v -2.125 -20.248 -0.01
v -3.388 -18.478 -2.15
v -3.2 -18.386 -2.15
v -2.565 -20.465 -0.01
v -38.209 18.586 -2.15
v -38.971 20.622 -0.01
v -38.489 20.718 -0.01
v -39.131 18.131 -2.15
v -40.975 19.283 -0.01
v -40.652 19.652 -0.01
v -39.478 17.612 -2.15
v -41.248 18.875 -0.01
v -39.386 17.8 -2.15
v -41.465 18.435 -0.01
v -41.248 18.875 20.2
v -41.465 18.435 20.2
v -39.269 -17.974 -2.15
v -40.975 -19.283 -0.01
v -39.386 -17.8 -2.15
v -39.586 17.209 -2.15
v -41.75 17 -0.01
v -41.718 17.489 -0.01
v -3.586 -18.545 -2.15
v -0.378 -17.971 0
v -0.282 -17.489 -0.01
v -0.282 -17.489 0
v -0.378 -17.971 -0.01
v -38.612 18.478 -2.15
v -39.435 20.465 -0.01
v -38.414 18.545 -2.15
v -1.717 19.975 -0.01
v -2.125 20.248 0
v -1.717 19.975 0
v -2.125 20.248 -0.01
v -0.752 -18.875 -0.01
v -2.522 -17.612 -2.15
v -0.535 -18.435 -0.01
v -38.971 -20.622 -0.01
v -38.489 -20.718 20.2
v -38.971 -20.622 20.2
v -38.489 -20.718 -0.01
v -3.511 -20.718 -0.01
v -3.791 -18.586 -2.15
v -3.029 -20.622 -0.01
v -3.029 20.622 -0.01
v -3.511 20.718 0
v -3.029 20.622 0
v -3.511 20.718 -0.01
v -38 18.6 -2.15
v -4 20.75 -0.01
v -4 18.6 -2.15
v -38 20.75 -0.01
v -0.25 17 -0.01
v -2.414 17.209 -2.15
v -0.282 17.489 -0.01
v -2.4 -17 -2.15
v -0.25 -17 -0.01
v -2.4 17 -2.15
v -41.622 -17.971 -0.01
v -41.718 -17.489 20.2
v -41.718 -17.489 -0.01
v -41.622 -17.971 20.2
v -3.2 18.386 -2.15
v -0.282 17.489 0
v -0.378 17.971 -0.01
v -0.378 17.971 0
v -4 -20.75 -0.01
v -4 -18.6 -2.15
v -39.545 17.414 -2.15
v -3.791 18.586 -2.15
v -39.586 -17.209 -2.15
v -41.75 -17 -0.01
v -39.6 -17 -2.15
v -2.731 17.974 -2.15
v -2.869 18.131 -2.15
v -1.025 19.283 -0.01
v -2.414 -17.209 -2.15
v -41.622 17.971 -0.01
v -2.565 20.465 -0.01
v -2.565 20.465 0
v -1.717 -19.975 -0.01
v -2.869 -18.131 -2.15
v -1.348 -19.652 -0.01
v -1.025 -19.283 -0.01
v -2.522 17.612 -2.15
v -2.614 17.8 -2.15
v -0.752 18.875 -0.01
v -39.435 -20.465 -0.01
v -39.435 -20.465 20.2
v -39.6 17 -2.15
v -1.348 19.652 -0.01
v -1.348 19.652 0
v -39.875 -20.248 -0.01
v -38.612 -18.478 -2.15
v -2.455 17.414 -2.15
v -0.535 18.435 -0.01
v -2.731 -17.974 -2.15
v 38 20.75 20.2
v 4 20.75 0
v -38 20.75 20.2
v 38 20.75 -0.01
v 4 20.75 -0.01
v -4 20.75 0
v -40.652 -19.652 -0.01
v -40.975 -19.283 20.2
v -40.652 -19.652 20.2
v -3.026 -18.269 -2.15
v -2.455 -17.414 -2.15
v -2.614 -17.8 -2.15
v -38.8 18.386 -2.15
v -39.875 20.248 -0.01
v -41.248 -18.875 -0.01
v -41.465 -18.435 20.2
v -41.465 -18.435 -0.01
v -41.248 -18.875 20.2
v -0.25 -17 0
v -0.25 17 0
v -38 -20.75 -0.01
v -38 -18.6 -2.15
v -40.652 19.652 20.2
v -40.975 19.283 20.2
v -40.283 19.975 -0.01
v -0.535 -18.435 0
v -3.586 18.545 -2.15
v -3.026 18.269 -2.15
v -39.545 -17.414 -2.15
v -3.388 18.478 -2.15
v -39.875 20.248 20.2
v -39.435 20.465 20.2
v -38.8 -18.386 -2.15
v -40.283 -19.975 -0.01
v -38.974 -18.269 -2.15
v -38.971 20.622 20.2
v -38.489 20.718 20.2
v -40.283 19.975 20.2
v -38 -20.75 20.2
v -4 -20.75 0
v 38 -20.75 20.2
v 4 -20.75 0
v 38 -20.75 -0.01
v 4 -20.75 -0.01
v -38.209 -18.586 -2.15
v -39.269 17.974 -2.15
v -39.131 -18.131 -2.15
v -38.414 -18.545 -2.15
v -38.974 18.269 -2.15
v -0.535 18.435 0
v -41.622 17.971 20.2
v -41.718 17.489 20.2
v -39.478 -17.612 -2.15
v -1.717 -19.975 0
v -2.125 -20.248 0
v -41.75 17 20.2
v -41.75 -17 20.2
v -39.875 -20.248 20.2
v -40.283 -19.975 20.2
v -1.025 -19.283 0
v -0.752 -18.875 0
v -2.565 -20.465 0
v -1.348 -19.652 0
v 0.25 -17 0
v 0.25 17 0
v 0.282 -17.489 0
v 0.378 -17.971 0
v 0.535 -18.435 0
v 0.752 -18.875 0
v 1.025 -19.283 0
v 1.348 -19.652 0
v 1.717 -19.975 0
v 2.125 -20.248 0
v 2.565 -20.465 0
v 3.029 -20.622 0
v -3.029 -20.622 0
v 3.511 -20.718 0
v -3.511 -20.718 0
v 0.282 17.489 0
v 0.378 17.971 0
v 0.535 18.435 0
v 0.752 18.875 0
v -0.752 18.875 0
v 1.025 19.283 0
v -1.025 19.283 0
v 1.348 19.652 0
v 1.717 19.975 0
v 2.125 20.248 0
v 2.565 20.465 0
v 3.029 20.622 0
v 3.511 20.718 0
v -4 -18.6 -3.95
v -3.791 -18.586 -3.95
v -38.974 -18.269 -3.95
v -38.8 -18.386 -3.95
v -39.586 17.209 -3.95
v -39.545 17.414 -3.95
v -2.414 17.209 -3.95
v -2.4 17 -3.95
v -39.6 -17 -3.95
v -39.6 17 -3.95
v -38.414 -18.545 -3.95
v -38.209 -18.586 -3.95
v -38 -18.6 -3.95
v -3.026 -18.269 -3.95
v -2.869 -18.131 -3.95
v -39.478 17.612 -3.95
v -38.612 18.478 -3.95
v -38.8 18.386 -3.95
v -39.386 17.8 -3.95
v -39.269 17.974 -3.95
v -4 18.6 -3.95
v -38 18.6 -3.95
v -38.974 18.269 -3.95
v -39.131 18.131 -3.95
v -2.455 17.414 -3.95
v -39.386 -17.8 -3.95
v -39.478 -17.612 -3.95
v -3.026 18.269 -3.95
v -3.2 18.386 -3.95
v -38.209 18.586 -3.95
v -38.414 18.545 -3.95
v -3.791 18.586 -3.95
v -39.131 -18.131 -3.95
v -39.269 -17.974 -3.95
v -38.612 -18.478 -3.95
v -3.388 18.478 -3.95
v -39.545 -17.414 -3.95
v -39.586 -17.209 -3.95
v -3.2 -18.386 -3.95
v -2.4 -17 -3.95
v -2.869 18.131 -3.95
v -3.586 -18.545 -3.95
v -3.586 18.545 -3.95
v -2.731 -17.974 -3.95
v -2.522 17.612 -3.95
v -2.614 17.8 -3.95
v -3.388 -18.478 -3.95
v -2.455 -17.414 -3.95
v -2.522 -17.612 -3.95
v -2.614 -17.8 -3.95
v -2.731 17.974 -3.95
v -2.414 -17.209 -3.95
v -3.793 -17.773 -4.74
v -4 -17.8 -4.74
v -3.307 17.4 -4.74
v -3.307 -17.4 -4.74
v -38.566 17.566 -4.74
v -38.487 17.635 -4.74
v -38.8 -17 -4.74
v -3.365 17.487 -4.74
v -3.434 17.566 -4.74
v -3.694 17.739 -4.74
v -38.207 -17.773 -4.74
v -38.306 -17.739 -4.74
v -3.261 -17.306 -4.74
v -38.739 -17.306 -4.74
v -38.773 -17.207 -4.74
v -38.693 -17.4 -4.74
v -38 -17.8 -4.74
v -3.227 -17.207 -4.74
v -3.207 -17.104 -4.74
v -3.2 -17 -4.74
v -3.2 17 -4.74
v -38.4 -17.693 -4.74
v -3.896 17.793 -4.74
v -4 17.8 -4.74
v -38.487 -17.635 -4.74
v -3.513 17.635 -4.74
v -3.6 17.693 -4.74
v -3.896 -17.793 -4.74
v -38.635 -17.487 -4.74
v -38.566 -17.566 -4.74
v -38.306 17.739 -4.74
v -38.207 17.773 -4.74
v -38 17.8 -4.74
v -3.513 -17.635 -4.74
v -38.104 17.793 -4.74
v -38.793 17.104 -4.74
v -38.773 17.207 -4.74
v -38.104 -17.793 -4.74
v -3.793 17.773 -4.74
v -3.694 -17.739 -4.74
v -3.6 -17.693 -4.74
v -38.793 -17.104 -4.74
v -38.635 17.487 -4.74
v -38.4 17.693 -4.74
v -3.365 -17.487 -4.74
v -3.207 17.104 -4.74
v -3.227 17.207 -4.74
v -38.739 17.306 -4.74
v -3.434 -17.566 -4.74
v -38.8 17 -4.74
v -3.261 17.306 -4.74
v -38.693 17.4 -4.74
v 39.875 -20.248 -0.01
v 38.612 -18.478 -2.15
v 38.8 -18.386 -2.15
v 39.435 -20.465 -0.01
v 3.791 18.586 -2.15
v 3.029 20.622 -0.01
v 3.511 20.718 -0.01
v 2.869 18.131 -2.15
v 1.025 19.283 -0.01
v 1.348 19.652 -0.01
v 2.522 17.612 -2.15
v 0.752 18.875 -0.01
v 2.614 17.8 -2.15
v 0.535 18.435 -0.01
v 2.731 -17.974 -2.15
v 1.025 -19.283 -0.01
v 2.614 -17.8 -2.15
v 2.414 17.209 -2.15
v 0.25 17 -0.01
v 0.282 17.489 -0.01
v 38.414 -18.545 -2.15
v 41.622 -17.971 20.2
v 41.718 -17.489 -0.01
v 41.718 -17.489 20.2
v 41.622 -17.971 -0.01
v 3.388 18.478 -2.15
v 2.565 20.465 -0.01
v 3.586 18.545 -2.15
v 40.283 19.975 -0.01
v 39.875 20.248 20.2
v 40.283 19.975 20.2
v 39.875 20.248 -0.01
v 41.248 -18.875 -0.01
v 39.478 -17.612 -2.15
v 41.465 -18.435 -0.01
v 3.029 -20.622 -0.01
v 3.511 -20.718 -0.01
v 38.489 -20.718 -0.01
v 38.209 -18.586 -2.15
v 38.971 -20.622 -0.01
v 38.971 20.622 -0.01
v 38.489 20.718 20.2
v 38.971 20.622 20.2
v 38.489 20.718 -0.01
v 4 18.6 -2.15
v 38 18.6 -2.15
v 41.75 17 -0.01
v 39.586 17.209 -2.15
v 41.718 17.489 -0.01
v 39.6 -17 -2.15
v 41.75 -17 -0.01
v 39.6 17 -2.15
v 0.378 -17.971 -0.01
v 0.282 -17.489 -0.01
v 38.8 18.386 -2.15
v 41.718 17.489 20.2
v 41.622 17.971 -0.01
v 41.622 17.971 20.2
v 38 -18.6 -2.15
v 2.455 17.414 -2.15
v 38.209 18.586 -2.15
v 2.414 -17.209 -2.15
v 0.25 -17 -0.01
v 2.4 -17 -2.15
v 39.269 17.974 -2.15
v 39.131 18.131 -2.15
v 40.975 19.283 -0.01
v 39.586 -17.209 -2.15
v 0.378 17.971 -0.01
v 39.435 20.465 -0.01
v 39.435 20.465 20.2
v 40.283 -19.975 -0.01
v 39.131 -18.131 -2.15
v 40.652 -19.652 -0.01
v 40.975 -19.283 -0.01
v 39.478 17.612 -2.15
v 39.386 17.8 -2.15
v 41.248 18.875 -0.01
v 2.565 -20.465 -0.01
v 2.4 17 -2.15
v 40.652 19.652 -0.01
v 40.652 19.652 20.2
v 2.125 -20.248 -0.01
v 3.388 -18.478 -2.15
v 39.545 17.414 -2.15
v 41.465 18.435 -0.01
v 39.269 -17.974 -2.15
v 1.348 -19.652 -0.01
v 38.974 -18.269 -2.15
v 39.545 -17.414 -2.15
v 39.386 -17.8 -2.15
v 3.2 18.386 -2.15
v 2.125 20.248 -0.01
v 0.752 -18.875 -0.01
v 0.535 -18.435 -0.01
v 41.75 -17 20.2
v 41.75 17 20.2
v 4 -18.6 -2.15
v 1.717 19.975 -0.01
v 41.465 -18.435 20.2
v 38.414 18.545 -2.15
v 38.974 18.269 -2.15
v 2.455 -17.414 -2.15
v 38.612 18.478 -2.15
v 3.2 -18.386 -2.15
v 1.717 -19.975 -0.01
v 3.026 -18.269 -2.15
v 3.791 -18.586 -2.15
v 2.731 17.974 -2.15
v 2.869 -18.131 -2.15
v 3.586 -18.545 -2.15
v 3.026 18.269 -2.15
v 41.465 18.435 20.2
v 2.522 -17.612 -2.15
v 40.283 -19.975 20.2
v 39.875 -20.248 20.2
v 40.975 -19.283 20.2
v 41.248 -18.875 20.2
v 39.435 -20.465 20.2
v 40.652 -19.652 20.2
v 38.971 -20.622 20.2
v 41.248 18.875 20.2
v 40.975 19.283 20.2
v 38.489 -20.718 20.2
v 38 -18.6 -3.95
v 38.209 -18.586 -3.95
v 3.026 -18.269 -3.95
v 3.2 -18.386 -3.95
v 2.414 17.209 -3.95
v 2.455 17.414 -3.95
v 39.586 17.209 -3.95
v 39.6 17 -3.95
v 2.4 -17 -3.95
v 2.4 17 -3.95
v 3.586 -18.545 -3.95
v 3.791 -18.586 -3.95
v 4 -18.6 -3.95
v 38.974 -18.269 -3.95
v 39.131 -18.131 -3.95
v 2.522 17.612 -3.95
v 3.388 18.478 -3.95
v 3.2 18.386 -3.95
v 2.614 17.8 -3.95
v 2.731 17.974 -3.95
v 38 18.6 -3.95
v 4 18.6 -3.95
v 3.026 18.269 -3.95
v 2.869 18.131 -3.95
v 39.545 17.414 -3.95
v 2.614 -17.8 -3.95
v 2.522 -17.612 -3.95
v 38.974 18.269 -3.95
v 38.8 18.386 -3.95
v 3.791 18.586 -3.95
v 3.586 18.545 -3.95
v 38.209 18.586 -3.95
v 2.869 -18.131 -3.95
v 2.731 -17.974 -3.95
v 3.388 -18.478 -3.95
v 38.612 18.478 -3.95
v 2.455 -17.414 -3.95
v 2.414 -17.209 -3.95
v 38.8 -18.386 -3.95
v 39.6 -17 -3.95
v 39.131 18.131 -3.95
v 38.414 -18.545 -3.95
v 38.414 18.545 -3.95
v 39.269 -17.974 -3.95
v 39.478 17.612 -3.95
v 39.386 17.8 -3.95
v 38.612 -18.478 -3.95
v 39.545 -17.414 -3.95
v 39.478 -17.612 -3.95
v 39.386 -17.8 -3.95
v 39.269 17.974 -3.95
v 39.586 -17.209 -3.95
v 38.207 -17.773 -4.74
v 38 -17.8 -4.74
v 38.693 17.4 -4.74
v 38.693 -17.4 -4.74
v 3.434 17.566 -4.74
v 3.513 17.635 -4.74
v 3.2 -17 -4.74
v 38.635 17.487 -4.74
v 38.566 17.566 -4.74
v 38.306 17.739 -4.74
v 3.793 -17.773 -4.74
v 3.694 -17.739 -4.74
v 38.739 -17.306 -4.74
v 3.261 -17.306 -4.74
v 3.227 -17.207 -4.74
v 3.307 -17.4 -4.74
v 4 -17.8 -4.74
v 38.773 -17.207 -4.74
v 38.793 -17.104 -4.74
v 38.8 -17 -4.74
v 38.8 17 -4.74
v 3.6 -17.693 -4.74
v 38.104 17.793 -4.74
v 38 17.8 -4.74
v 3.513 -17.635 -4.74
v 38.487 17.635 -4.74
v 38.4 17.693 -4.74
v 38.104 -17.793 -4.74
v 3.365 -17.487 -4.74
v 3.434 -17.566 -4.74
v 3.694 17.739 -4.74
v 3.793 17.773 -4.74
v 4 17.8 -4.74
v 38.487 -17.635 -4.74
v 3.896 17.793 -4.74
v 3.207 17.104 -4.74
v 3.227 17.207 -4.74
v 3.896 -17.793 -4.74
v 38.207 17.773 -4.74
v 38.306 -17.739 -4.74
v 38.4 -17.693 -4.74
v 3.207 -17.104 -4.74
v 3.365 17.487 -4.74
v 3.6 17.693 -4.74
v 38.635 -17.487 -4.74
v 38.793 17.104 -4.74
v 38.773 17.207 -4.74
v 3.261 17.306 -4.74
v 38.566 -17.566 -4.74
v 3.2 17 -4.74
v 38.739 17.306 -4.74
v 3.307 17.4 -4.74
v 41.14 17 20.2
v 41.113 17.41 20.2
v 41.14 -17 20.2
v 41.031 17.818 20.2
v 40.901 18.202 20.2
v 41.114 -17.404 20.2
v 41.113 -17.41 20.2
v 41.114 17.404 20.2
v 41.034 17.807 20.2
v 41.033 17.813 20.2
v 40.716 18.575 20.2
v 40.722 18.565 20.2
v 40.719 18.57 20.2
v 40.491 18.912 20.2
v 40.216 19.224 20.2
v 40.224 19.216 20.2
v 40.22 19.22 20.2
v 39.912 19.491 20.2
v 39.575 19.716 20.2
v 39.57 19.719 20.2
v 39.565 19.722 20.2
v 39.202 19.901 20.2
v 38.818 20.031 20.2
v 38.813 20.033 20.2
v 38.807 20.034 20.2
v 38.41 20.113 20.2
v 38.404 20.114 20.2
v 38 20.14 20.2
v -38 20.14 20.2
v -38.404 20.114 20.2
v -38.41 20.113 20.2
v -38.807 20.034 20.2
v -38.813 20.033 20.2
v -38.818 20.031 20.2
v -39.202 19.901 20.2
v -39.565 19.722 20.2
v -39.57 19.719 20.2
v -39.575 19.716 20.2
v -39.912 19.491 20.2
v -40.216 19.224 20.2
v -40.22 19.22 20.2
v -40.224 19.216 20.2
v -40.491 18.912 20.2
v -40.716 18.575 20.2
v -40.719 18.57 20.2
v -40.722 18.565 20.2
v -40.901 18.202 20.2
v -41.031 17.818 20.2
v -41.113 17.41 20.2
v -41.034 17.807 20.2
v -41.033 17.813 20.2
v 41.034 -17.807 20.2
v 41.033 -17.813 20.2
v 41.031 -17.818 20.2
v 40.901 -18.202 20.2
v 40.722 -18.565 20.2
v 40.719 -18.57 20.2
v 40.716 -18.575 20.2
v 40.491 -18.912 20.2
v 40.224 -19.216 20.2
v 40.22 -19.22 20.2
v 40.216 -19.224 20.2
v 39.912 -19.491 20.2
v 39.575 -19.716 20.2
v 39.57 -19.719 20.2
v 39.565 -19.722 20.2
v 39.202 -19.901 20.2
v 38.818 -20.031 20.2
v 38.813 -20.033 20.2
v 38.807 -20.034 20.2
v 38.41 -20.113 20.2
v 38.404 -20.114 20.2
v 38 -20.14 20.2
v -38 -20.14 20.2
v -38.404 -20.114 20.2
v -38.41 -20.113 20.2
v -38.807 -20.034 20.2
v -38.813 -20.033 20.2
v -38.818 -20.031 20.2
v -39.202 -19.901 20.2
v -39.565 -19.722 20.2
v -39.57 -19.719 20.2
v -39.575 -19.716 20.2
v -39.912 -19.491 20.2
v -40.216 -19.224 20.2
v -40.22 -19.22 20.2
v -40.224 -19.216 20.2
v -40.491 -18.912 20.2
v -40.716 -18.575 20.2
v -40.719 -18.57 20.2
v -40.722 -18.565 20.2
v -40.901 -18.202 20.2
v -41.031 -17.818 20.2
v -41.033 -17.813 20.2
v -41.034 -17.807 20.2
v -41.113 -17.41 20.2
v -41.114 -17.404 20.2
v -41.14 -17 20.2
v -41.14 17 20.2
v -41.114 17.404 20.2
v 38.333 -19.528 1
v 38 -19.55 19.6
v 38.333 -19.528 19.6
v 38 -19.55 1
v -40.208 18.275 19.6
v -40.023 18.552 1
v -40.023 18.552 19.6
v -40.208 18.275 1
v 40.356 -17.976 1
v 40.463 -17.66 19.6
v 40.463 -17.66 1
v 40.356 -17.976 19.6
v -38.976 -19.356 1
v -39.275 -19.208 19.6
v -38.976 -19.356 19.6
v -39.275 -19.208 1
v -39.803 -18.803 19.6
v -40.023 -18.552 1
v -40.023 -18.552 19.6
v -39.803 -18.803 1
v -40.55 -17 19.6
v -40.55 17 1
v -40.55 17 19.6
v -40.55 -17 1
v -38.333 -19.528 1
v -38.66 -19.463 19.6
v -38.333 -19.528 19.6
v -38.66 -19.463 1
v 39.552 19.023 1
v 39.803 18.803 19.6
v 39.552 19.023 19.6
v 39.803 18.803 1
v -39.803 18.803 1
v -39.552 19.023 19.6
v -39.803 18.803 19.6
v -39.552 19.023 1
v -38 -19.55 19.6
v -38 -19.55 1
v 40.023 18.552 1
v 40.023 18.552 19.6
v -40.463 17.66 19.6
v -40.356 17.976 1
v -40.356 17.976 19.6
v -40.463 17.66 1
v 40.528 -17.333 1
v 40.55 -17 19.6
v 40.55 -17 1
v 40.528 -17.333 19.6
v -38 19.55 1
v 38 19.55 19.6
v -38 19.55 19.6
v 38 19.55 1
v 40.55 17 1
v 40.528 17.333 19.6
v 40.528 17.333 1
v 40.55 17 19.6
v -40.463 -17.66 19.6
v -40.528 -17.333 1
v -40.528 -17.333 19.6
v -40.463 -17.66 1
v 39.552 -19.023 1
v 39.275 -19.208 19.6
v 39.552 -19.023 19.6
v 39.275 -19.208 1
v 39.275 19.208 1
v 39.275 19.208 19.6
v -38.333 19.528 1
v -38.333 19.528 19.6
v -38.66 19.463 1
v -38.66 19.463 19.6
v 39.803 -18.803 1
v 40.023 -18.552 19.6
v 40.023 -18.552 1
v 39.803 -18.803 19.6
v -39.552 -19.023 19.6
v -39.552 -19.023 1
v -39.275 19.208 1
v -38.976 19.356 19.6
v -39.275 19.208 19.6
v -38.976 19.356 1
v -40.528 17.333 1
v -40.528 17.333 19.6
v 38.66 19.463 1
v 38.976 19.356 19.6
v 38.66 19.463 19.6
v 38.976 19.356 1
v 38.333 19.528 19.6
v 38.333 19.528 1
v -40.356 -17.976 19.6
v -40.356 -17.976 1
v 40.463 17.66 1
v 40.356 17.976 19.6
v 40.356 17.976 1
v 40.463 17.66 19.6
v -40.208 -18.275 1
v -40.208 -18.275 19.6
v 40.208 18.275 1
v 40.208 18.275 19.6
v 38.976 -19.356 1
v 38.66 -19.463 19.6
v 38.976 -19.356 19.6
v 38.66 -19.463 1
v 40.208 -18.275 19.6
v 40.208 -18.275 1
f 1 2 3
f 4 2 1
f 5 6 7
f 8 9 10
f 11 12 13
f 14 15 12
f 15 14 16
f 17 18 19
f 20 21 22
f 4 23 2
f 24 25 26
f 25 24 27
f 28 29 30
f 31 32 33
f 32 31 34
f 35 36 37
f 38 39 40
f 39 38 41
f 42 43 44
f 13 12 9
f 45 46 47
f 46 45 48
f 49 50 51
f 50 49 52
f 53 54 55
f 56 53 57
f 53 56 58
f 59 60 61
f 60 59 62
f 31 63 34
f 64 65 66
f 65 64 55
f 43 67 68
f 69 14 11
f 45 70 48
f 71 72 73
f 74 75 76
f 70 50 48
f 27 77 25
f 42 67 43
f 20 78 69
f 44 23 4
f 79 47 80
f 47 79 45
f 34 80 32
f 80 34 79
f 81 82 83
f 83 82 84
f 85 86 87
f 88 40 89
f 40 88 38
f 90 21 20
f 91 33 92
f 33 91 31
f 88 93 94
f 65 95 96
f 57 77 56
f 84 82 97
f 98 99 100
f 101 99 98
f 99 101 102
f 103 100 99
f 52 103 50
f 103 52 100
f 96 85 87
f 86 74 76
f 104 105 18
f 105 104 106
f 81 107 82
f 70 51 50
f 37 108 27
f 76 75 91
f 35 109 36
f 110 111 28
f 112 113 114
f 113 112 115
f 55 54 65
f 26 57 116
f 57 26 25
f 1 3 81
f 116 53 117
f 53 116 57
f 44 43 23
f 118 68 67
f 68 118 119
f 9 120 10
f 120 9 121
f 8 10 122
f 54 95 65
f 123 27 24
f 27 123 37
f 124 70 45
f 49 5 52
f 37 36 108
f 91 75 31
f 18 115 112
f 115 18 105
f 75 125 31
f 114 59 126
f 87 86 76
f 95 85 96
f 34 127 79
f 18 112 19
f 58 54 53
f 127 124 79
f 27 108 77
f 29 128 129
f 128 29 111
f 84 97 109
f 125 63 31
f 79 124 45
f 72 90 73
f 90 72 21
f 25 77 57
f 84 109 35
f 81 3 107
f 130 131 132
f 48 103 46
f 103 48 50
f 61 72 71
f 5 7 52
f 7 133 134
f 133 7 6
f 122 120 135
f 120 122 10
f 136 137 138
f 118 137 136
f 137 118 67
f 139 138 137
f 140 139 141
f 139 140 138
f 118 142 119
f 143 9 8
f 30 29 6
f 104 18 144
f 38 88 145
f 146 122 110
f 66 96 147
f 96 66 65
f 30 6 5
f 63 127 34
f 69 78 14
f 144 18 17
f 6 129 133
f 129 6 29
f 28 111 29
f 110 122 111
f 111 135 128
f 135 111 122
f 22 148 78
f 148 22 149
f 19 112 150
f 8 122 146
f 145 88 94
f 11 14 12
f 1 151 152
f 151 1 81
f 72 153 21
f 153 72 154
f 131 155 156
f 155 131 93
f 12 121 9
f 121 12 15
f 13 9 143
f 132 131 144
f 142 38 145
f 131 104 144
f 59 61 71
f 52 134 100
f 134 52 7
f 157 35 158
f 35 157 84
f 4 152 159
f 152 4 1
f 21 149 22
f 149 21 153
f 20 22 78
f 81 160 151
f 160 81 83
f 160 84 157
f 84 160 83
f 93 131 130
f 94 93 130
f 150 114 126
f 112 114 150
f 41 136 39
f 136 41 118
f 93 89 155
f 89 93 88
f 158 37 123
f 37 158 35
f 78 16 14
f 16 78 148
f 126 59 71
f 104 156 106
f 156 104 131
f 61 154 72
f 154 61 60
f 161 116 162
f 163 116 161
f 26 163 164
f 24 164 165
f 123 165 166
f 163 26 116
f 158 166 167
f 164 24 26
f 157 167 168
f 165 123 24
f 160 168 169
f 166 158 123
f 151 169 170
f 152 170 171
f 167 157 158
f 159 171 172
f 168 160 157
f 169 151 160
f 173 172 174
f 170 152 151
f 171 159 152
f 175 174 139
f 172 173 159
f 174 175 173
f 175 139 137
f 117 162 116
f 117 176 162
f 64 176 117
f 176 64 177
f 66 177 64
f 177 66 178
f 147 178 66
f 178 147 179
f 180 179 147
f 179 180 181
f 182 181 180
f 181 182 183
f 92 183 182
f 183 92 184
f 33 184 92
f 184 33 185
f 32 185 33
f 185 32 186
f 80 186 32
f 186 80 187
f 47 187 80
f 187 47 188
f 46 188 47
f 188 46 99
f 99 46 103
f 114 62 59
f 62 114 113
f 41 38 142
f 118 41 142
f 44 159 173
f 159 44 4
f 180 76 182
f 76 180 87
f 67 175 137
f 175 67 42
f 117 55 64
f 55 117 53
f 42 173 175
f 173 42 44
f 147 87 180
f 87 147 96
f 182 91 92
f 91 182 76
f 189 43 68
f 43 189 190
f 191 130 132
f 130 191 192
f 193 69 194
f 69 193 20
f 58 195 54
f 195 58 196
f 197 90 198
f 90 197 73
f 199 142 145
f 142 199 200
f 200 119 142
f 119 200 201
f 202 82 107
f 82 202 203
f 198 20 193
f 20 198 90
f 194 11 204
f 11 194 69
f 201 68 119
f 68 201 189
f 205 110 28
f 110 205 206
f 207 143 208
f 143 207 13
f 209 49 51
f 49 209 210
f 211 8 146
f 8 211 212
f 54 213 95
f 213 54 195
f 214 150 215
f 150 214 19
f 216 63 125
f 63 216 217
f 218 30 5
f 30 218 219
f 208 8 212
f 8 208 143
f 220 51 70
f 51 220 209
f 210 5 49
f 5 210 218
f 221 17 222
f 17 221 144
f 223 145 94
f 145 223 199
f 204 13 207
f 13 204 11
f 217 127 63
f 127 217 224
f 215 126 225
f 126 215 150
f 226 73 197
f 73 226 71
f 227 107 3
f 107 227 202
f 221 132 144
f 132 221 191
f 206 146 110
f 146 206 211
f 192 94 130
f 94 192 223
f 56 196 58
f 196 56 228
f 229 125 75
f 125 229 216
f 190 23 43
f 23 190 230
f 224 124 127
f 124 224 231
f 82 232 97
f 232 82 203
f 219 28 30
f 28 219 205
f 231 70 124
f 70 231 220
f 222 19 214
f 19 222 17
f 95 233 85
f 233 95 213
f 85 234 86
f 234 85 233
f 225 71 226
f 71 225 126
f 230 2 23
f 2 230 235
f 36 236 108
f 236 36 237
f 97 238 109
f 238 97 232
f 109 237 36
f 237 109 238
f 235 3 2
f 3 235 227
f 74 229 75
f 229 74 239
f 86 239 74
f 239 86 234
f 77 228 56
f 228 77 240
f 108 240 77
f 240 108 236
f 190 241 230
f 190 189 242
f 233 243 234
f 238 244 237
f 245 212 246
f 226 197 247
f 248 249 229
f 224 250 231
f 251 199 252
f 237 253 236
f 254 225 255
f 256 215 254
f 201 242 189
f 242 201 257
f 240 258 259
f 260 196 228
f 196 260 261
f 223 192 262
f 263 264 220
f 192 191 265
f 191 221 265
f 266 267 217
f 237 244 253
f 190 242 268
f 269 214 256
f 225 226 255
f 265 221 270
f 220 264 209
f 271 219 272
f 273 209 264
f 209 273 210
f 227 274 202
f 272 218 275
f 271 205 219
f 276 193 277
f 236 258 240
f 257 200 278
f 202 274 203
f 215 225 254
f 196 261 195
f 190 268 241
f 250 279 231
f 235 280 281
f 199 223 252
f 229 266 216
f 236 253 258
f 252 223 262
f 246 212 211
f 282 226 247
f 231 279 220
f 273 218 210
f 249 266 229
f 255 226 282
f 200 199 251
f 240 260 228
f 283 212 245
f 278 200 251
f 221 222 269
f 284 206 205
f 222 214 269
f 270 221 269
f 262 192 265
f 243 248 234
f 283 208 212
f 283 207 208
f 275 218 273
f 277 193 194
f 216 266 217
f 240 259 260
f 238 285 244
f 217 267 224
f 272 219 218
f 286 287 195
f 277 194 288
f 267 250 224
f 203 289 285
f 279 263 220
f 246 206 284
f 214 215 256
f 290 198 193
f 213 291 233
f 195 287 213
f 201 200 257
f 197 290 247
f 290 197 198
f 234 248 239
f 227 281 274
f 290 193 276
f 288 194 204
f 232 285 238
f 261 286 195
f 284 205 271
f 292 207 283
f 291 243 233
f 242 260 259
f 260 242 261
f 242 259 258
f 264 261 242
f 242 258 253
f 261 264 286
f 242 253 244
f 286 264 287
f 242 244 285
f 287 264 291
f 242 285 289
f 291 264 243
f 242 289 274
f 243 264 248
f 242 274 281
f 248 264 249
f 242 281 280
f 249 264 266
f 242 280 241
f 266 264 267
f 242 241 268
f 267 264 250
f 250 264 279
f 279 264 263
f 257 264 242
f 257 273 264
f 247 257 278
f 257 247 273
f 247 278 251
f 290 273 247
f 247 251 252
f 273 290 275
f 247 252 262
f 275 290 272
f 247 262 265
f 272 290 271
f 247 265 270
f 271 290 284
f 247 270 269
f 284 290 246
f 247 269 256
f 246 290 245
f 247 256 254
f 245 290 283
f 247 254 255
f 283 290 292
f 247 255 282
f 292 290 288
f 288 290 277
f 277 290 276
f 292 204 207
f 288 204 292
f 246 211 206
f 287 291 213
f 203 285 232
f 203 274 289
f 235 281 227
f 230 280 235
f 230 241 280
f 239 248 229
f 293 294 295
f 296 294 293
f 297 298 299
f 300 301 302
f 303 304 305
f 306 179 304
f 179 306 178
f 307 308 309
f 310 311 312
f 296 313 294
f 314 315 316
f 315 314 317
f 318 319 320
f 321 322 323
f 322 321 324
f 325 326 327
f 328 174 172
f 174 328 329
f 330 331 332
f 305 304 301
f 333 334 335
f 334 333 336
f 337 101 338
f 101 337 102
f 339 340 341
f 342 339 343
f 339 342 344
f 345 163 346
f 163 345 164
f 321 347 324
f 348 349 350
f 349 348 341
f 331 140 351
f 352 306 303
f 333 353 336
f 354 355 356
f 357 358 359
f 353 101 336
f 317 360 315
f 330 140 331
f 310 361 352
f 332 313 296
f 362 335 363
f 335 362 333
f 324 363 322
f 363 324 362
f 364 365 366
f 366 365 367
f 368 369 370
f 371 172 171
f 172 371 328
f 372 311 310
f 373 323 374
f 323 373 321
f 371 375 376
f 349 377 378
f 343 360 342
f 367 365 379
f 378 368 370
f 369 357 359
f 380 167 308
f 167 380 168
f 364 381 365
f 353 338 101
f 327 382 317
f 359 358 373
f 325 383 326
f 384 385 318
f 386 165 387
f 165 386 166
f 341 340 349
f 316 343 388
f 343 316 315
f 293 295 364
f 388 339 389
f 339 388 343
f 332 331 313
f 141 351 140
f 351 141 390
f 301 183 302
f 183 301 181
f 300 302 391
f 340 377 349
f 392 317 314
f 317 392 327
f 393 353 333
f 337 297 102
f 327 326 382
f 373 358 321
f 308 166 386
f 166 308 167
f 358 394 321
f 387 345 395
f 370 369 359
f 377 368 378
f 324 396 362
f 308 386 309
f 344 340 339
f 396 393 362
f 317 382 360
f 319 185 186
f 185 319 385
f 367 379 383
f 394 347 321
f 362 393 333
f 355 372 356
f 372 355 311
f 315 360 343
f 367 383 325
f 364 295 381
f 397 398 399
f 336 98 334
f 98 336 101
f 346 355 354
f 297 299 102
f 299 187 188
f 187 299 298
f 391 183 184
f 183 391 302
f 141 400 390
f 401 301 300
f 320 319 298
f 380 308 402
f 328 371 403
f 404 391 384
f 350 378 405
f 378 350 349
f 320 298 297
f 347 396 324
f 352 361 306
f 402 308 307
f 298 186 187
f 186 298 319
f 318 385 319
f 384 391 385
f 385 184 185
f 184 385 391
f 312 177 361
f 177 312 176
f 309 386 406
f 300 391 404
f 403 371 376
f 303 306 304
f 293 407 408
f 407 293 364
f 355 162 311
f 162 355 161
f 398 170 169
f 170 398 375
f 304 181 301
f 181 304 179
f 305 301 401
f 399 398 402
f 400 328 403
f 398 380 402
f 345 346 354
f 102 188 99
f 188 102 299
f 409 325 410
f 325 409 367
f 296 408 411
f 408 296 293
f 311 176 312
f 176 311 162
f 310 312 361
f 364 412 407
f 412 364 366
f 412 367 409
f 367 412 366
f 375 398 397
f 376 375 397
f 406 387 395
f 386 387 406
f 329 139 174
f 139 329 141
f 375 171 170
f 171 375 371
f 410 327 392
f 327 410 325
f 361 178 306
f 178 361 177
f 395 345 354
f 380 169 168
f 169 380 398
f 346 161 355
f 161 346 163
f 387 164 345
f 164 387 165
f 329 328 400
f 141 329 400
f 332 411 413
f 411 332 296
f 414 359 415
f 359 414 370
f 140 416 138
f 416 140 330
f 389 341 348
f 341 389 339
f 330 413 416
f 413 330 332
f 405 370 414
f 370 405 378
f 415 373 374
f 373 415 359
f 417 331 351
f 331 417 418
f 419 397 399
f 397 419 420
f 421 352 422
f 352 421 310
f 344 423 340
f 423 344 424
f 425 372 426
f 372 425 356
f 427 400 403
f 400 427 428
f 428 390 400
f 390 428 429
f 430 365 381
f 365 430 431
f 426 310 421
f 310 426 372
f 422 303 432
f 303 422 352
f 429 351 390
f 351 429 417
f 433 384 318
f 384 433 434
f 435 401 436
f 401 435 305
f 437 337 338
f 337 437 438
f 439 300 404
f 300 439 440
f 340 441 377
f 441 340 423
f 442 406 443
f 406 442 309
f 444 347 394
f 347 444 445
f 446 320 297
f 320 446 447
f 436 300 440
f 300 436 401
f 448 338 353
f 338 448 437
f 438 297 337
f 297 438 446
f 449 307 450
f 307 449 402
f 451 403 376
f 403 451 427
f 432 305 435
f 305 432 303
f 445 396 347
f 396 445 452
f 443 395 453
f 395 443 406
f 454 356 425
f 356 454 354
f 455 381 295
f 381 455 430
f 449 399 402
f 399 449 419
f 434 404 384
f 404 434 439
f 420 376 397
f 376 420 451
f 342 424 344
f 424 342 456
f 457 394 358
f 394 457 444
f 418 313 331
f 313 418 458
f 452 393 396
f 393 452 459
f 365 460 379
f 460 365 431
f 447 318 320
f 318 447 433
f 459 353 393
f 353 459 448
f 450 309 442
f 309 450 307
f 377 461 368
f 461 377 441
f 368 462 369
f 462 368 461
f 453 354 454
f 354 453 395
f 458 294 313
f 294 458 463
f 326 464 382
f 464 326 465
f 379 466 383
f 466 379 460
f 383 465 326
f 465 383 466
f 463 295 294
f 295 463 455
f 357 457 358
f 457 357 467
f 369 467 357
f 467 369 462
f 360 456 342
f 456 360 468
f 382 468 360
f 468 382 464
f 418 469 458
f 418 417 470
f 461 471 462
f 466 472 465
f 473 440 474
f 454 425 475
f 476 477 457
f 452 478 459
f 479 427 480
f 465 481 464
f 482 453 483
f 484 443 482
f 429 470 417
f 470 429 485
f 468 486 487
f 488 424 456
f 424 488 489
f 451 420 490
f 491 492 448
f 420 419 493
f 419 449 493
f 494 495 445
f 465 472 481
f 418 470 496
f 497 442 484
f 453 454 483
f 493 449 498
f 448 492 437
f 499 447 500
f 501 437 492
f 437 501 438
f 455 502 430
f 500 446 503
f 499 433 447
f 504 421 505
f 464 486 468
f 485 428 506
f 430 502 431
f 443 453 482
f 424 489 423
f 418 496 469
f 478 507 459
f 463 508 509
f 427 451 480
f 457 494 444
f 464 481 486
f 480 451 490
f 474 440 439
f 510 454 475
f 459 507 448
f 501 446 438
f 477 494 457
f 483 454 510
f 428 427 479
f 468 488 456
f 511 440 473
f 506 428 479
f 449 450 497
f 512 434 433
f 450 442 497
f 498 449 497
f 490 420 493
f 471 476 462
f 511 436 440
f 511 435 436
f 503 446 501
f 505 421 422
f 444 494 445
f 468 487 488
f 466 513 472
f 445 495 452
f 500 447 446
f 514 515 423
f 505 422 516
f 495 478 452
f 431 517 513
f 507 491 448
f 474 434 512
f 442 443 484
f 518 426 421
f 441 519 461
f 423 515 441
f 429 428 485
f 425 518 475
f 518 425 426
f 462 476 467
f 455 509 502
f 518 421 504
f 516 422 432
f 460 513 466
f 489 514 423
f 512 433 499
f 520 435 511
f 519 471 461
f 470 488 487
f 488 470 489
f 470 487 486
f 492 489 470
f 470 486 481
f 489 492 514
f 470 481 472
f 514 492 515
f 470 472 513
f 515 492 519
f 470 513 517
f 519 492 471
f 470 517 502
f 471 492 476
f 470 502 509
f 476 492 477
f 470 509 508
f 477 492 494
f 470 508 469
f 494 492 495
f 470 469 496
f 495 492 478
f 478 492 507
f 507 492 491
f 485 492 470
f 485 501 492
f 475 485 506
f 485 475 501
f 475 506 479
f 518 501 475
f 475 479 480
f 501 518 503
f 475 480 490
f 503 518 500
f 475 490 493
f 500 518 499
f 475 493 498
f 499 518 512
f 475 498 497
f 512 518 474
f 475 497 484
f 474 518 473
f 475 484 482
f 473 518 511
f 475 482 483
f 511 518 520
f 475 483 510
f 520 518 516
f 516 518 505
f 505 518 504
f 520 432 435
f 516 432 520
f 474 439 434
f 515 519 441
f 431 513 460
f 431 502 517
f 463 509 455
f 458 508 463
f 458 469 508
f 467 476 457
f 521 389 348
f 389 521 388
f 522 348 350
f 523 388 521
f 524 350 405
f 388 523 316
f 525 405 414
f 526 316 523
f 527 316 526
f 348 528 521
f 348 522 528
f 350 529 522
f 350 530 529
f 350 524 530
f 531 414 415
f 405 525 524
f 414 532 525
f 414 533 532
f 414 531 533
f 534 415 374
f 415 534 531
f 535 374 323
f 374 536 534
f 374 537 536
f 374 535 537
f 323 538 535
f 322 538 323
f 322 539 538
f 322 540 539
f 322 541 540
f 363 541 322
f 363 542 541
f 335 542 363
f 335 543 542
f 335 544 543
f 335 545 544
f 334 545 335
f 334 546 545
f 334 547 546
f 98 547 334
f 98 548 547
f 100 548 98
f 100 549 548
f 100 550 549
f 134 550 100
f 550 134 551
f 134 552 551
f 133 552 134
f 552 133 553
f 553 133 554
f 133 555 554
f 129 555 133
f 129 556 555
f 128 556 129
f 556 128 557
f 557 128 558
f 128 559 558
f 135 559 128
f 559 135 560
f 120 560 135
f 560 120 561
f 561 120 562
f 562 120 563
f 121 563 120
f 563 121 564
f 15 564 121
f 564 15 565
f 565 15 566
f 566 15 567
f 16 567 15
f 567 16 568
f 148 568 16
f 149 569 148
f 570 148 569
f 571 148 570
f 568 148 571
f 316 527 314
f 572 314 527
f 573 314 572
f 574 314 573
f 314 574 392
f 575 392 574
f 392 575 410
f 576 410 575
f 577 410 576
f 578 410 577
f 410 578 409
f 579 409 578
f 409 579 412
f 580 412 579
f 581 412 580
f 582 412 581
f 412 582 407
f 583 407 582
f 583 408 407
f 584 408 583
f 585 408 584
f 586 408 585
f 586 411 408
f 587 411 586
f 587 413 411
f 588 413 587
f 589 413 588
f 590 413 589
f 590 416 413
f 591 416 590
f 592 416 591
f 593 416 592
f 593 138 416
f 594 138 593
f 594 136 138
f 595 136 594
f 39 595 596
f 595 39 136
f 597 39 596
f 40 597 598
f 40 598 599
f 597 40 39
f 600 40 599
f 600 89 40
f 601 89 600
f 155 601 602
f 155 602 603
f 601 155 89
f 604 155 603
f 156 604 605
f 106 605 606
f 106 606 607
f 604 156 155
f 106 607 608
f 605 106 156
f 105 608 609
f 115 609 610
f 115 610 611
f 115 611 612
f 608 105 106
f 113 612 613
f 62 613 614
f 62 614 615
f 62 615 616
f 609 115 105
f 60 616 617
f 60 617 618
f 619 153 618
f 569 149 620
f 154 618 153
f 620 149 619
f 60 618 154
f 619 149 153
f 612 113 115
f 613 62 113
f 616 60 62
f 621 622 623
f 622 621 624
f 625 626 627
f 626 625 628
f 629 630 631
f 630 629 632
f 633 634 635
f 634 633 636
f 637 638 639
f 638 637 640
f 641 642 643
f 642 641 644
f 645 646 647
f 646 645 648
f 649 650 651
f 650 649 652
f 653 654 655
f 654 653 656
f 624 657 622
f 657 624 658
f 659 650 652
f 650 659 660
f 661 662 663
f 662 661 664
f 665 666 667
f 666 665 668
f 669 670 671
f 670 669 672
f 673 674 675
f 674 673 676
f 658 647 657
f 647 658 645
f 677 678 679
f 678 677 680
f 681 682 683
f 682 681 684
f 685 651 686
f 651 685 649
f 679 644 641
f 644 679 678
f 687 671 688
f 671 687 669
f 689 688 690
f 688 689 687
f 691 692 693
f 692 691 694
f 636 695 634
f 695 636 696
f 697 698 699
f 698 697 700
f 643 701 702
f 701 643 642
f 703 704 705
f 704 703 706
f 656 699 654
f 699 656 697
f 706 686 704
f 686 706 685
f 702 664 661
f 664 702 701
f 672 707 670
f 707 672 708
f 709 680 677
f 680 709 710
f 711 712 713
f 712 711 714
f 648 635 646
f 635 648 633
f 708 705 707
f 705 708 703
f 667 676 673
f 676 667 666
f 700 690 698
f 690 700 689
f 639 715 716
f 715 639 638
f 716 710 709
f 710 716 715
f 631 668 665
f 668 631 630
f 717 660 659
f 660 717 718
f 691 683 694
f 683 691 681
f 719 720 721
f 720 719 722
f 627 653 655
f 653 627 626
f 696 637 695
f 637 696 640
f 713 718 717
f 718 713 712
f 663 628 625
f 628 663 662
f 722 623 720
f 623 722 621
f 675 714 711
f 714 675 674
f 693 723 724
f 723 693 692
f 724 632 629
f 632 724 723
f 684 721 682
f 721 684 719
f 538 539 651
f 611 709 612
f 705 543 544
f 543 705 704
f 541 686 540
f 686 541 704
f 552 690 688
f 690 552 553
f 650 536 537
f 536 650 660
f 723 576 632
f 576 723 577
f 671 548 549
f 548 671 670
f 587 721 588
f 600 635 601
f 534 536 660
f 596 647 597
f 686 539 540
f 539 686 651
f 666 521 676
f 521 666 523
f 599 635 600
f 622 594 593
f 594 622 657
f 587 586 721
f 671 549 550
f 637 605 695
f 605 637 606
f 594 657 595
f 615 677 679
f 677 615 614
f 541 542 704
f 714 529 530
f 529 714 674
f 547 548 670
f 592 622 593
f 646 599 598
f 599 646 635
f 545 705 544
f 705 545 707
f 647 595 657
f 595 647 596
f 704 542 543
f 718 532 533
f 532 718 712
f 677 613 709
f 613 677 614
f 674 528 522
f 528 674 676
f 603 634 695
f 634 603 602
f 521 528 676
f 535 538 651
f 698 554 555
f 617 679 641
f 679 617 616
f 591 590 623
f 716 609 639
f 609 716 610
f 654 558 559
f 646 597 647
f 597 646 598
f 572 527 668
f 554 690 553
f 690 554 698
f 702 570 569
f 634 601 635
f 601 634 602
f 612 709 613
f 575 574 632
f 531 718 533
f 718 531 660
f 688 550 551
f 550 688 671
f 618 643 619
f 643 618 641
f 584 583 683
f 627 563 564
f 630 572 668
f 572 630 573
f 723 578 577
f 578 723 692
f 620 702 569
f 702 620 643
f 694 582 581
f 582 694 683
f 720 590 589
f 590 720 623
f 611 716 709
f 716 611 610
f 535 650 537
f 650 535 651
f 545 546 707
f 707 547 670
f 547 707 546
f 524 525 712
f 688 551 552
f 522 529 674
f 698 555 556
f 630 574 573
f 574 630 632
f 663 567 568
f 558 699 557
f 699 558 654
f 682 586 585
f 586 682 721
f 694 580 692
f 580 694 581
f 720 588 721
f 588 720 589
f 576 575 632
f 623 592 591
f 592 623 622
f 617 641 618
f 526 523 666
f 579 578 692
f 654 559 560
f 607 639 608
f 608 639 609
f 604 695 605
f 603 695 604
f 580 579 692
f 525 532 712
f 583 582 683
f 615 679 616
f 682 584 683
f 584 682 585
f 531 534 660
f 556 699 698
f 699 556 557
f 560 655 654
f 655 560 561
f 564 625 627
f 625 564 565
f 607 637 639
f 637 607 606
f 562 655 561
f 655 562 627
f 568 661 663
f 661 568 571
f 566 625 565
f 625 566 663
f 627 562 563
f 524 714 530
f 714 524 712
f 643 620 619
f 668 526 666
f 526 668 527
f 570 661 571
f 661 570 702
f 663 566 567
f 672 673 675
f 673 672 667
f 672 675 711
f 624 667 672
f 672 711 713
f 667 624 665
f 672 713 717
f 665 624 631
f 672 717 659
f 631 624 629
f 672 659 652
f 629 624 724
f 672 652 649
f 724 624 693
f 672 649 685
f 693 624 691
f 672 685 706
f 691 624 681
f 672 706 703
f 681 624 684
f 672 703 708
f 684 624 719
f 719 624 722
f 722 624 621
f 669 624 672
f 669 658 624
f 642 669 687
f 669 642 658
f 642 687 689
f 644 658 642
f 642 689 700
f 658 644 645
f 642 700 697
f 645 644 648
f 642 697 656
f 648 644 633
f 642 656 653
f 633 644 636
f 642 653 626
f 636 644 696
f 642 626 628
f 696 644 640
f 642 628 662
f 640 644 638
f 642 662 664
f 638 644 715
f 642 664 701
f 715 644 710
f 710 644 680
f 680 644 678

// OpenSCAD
// ============================================
// Gridfinity Parametric Bin + Baseplate  v1
// 42mm modular storage system (spec by Zack Freedman)
//
// THIS IS GRIDFINITY (42mm grid, bins + baseplates for
// drawer / desktop organization) -- a DIFFERENT system
// from the OpenGrid (28mm wall-mount) files in this repo.
//
// Set `part` below to choose what to render:
//   "bin"       -> a storage bin (gx x gy x gh units)
//   "baseplate" -> a baseplate the bins drop into (gx x gy)
//
// Canonical dimensions (Gridfinity spec):
//   Grid pitch (X/Y) ........ 42.0 mm
//   Height unit (Z) ......... 7.0 mm
//   Bin/foot clearance ...... 0.25 mm per side (0.5 total)
//   Base ("foot") profile, top -> bottom:
//       2.15 mm  45-degree chamfer (top, meets body)
//       1.80 mm  vertical
//       0.80 mm  45-degree chamfer (bottom edge)
//     => base height 4.75 mm, bottom corner radius 0.8 mm
//
// Repo: github.com/johntondreau-png/opengrid-desk-mounts
// ============================================

/* [What to render] */
// Part to generate
part = "bin"; // [bin, baseplate]

/* [Grid Size] */
// Footprint width in grid units (X)
gx = 2;
// Footprint depth in grid units (Y)
gy = 1;
// Bin height in 7mm units (Z) -- ignored for baseplate
gh = 3;

/* [Bin Options] */
// Outer wall thickness (mm)
wall = 1.2;
// Solid floor thickness above the base feet (mm)
floor_th = 1.0;
// Add a stacking lip on top so bins nest when stacked
stacking_lip = true;
// Compartment dividers along X (0 = none)
divx = 0;
// Compartment dividers along Y (0 = none)
divy = 0;
// Divider wall thickness (mm)
div_wall = 1.2;

/* [Baseplate Options] */
// Solid floor under the foot pockets (mm)
bp_floor = 0.8;

/* [Quality] */
// Facets per circle (raise for final render)
$fn = 48;

// ============================================
// Constants (Gridfinity spec -- do not change)
// ============================================
PITCH      = 42.0;          // grid center-to-center
Z_UNIT     = 7.0;           // height unit
CLEAR      = 0.25;          // clearance per side
BODY       = PITCH - 2*CLEAR; // 41.5mm body footprint per cell
R_OUT      = 3.75;          // outer corner radius (top of base / body)

// Base ("foot") profile segment heights, top -> bottom
CH_TOP     = 2.15;          // upper 45deg chamfer
STRAIGHT   = 1.80;          // vertical mid section
CH_BOT     = 0.80;          // lower 45deg chamfer
BASE_H     = CH_TOP + STRAIGHT + CH_BOT;  // 4.75mm

EPS        = 0.01;

// Derived footprint sizes (whole bin)
function fp_w() = gx*PITCH - 2*CLEAR;   // outer width
function fp_d() = gy*PITCH - 2*CLEAR;   // outer depth

// ============================================
// Helpers
// ============================================

// A thin rounded-rectangle plate, centered, side = [w,d], corner r.
module rplate(w, d, r, h = EPS) {
    linear_extrude(height = h)
        offset(r = r) square([w - 2*r, d - 2*r], center = true);
}

// One Gridfinity base "foot", centered on origin.
// Widest face (the top, where it meets the body) is flush at z = 0;
// the foot extends DOWN to z = -BASE_H.
module foot() {
    // sizes at each profile break (square side per single cell)
    s_top = BODY;                 // 41.5  (r = R_OUT = 3.75)
    s_mid = BODY - 2*CH_TOP;      // 37.20 (r = 1.60)
    s_bot = s_mid - 2*CH_BOT;     // 35.60 (r = 0.80)
    r_mid = R_OUT - CH_TOP;       // 1.60
    r_bot = r_mid - CH_BOT;       // 0.80

    // upper chamfer: z = 0 -> z = -CH_TOP
    hull() {
        translate([0, 0, -EPS])      rplate(s_top, s_top, R_OUT);
        translate([0, 0, -CH_TOP])   rplate(s_mid, s_mid, r_mid);
    }
    // vertical mid: z = -CH_TOP -> z = -(CH_TOP+STRAIGHT)
    translate([0, 0, -(CH_TOP + STRAIGHT)])
        rplate(s_mid, s_mid, r_mid, STRAIGHT);
    // lower chamfer: -> z = -BASE_H
    hull() {
        translate([0, 0, -(CH_TOP + STRAIGHT)])     rplate(s_mid, s_mid, r_mid);
        translate([0, 0, -BASE_H + EPS])            rplate(s_bot, s_bot, r_bot);
    }
}

// Centers of every grid cell, used to tile feet / pockets.
module for_each_cell() {
    for (i = [0 : gx-1], j = [0 : gy-1])
        translate([ (i - (gx-1)/2) * PITCH,
                    (j - (gy-1)/2) * PITCH, 0 ])
            children();
}

// ============================================
// BIN
// Feet (z<0) + solid body block (z>0), hollowed into a
// compartment, with optional stacking lip and dividers.
// Overall height = gh * Z_UNIT (feet included).
// ============================================
module bin() {
    body_h = gh*Z_UNIT - BASE_H;   // body sits on top of the feet
    W = fp_w();
    D = fp_d();

    difference() {
        union() {
            // feet, one per grid cell
            for_each_cell() foot();
            // body block
            rplate(W, D, R_OUT, body_h);
            if (stacking_lip) translate([0, 0, body_h]) lip();
        }
        // hollow compartment(s)
        cavity(body_h);
    }
}

// Inner compartment cut (open top), respecting dividers.
module cavity(body_h) {
    iw = W_inner();
    id = D_inner();
    ir = max(R_OUT - wall, 0.1);
    // usable inner footprint, minus floor, open well above the top
    nx = divx + 1;
    ny = divy + 1;
    // size of one compartment opening
    cw = (iw - divx*div_wall) / nx;
    cd = (id - divy*div_wall) / ny;
    for (a = [0 : nx-1], b = [0 : ny-1]) {
        cx = -iw/2 + cw/2 + a*(cw + div_wall);
        cy = -id/2 + cd/2 + b*(cd + div_wall);
        translate([cx, cy, floor_th])
            rplate(cw, cd, min(ir, cw/2 - 0.01, cd/2 - 0.01),
                   body_h);   // extends past top -> open
    }
}

function W_inner() = fp_w() - 2*wall;
function D_inner() = fp_d() - 2*wall;

// Stacking lip: extends the wall up by LIP_H and cuts a 45deg
// funnel into the TOP INNER edge, so the chamfered base feet of
// a bin stacked on top seat into this opening.
// Outer wall stays at full footprint (continues the body wall);
// the inner opening widens toward the top.
LIP_H = CH_TOP + STRAIGHT;   // ~3.95mm rim above the body
module lip() {
    W  = fp_w();
    D  = fp_d();
    iw = W - 2*wall;         // inner bore = matches the cavity
    id = D - 2*wall;
    ir = max(R_OUT - wall, 0.1);
    // funnel: leave ~0.6mm of vertical wall at the very top
    top_wall  = 0.6;
    flare     = wall - top_wall;   // horizontal opening per side
    difference() {
        rplate(W, D, R_OUT, LIP_H);                       // rim outer
        translate([0, 0, -EPS])                           // straight bore
            rplate(iw, id, ir, LIP_H + 2*EPS);
        // 45deg flare on the top inner edge (height == flare)
        translate([0, 0, LIP_H - flare])
            hull() {
                rplate(iw, id, ir);
                translate([0, 0, flare + EPS])
                    rplate(iw + 2*flare, id + 2*flare,
                           min(ir + flare, R_OUT), EPS);
            }
    }
}

// ============================================
// BASEPLATE
// Solid plate with a foot-shaped pocket cut into each cell so
// bins drop in. Full pitch footprint so plates tile seamlessly.
// ============================================
module baseplate() {
    W = gx*PITCH;
    D = gy*PITCH;
    total_h = BASE_H + bp_floor;
    difference() {
        // plate: top face at z = 0, extends down by total_h
        translate([0, 0, -total_h])
            rplate(W, D, R_OUT + CLEAR, total_h);
        // foot-shaped pocket in each cell; lift slightly so the
        // pocket mouth cleanly breaks the plate's top face
        for_each_cell() translate([0, 0, EPS]) foot();
    }
}

// ============================================
// RENDER
// ============================================
if (part == "bin")            bin();
else if (part == "baseplate") baseplate();
